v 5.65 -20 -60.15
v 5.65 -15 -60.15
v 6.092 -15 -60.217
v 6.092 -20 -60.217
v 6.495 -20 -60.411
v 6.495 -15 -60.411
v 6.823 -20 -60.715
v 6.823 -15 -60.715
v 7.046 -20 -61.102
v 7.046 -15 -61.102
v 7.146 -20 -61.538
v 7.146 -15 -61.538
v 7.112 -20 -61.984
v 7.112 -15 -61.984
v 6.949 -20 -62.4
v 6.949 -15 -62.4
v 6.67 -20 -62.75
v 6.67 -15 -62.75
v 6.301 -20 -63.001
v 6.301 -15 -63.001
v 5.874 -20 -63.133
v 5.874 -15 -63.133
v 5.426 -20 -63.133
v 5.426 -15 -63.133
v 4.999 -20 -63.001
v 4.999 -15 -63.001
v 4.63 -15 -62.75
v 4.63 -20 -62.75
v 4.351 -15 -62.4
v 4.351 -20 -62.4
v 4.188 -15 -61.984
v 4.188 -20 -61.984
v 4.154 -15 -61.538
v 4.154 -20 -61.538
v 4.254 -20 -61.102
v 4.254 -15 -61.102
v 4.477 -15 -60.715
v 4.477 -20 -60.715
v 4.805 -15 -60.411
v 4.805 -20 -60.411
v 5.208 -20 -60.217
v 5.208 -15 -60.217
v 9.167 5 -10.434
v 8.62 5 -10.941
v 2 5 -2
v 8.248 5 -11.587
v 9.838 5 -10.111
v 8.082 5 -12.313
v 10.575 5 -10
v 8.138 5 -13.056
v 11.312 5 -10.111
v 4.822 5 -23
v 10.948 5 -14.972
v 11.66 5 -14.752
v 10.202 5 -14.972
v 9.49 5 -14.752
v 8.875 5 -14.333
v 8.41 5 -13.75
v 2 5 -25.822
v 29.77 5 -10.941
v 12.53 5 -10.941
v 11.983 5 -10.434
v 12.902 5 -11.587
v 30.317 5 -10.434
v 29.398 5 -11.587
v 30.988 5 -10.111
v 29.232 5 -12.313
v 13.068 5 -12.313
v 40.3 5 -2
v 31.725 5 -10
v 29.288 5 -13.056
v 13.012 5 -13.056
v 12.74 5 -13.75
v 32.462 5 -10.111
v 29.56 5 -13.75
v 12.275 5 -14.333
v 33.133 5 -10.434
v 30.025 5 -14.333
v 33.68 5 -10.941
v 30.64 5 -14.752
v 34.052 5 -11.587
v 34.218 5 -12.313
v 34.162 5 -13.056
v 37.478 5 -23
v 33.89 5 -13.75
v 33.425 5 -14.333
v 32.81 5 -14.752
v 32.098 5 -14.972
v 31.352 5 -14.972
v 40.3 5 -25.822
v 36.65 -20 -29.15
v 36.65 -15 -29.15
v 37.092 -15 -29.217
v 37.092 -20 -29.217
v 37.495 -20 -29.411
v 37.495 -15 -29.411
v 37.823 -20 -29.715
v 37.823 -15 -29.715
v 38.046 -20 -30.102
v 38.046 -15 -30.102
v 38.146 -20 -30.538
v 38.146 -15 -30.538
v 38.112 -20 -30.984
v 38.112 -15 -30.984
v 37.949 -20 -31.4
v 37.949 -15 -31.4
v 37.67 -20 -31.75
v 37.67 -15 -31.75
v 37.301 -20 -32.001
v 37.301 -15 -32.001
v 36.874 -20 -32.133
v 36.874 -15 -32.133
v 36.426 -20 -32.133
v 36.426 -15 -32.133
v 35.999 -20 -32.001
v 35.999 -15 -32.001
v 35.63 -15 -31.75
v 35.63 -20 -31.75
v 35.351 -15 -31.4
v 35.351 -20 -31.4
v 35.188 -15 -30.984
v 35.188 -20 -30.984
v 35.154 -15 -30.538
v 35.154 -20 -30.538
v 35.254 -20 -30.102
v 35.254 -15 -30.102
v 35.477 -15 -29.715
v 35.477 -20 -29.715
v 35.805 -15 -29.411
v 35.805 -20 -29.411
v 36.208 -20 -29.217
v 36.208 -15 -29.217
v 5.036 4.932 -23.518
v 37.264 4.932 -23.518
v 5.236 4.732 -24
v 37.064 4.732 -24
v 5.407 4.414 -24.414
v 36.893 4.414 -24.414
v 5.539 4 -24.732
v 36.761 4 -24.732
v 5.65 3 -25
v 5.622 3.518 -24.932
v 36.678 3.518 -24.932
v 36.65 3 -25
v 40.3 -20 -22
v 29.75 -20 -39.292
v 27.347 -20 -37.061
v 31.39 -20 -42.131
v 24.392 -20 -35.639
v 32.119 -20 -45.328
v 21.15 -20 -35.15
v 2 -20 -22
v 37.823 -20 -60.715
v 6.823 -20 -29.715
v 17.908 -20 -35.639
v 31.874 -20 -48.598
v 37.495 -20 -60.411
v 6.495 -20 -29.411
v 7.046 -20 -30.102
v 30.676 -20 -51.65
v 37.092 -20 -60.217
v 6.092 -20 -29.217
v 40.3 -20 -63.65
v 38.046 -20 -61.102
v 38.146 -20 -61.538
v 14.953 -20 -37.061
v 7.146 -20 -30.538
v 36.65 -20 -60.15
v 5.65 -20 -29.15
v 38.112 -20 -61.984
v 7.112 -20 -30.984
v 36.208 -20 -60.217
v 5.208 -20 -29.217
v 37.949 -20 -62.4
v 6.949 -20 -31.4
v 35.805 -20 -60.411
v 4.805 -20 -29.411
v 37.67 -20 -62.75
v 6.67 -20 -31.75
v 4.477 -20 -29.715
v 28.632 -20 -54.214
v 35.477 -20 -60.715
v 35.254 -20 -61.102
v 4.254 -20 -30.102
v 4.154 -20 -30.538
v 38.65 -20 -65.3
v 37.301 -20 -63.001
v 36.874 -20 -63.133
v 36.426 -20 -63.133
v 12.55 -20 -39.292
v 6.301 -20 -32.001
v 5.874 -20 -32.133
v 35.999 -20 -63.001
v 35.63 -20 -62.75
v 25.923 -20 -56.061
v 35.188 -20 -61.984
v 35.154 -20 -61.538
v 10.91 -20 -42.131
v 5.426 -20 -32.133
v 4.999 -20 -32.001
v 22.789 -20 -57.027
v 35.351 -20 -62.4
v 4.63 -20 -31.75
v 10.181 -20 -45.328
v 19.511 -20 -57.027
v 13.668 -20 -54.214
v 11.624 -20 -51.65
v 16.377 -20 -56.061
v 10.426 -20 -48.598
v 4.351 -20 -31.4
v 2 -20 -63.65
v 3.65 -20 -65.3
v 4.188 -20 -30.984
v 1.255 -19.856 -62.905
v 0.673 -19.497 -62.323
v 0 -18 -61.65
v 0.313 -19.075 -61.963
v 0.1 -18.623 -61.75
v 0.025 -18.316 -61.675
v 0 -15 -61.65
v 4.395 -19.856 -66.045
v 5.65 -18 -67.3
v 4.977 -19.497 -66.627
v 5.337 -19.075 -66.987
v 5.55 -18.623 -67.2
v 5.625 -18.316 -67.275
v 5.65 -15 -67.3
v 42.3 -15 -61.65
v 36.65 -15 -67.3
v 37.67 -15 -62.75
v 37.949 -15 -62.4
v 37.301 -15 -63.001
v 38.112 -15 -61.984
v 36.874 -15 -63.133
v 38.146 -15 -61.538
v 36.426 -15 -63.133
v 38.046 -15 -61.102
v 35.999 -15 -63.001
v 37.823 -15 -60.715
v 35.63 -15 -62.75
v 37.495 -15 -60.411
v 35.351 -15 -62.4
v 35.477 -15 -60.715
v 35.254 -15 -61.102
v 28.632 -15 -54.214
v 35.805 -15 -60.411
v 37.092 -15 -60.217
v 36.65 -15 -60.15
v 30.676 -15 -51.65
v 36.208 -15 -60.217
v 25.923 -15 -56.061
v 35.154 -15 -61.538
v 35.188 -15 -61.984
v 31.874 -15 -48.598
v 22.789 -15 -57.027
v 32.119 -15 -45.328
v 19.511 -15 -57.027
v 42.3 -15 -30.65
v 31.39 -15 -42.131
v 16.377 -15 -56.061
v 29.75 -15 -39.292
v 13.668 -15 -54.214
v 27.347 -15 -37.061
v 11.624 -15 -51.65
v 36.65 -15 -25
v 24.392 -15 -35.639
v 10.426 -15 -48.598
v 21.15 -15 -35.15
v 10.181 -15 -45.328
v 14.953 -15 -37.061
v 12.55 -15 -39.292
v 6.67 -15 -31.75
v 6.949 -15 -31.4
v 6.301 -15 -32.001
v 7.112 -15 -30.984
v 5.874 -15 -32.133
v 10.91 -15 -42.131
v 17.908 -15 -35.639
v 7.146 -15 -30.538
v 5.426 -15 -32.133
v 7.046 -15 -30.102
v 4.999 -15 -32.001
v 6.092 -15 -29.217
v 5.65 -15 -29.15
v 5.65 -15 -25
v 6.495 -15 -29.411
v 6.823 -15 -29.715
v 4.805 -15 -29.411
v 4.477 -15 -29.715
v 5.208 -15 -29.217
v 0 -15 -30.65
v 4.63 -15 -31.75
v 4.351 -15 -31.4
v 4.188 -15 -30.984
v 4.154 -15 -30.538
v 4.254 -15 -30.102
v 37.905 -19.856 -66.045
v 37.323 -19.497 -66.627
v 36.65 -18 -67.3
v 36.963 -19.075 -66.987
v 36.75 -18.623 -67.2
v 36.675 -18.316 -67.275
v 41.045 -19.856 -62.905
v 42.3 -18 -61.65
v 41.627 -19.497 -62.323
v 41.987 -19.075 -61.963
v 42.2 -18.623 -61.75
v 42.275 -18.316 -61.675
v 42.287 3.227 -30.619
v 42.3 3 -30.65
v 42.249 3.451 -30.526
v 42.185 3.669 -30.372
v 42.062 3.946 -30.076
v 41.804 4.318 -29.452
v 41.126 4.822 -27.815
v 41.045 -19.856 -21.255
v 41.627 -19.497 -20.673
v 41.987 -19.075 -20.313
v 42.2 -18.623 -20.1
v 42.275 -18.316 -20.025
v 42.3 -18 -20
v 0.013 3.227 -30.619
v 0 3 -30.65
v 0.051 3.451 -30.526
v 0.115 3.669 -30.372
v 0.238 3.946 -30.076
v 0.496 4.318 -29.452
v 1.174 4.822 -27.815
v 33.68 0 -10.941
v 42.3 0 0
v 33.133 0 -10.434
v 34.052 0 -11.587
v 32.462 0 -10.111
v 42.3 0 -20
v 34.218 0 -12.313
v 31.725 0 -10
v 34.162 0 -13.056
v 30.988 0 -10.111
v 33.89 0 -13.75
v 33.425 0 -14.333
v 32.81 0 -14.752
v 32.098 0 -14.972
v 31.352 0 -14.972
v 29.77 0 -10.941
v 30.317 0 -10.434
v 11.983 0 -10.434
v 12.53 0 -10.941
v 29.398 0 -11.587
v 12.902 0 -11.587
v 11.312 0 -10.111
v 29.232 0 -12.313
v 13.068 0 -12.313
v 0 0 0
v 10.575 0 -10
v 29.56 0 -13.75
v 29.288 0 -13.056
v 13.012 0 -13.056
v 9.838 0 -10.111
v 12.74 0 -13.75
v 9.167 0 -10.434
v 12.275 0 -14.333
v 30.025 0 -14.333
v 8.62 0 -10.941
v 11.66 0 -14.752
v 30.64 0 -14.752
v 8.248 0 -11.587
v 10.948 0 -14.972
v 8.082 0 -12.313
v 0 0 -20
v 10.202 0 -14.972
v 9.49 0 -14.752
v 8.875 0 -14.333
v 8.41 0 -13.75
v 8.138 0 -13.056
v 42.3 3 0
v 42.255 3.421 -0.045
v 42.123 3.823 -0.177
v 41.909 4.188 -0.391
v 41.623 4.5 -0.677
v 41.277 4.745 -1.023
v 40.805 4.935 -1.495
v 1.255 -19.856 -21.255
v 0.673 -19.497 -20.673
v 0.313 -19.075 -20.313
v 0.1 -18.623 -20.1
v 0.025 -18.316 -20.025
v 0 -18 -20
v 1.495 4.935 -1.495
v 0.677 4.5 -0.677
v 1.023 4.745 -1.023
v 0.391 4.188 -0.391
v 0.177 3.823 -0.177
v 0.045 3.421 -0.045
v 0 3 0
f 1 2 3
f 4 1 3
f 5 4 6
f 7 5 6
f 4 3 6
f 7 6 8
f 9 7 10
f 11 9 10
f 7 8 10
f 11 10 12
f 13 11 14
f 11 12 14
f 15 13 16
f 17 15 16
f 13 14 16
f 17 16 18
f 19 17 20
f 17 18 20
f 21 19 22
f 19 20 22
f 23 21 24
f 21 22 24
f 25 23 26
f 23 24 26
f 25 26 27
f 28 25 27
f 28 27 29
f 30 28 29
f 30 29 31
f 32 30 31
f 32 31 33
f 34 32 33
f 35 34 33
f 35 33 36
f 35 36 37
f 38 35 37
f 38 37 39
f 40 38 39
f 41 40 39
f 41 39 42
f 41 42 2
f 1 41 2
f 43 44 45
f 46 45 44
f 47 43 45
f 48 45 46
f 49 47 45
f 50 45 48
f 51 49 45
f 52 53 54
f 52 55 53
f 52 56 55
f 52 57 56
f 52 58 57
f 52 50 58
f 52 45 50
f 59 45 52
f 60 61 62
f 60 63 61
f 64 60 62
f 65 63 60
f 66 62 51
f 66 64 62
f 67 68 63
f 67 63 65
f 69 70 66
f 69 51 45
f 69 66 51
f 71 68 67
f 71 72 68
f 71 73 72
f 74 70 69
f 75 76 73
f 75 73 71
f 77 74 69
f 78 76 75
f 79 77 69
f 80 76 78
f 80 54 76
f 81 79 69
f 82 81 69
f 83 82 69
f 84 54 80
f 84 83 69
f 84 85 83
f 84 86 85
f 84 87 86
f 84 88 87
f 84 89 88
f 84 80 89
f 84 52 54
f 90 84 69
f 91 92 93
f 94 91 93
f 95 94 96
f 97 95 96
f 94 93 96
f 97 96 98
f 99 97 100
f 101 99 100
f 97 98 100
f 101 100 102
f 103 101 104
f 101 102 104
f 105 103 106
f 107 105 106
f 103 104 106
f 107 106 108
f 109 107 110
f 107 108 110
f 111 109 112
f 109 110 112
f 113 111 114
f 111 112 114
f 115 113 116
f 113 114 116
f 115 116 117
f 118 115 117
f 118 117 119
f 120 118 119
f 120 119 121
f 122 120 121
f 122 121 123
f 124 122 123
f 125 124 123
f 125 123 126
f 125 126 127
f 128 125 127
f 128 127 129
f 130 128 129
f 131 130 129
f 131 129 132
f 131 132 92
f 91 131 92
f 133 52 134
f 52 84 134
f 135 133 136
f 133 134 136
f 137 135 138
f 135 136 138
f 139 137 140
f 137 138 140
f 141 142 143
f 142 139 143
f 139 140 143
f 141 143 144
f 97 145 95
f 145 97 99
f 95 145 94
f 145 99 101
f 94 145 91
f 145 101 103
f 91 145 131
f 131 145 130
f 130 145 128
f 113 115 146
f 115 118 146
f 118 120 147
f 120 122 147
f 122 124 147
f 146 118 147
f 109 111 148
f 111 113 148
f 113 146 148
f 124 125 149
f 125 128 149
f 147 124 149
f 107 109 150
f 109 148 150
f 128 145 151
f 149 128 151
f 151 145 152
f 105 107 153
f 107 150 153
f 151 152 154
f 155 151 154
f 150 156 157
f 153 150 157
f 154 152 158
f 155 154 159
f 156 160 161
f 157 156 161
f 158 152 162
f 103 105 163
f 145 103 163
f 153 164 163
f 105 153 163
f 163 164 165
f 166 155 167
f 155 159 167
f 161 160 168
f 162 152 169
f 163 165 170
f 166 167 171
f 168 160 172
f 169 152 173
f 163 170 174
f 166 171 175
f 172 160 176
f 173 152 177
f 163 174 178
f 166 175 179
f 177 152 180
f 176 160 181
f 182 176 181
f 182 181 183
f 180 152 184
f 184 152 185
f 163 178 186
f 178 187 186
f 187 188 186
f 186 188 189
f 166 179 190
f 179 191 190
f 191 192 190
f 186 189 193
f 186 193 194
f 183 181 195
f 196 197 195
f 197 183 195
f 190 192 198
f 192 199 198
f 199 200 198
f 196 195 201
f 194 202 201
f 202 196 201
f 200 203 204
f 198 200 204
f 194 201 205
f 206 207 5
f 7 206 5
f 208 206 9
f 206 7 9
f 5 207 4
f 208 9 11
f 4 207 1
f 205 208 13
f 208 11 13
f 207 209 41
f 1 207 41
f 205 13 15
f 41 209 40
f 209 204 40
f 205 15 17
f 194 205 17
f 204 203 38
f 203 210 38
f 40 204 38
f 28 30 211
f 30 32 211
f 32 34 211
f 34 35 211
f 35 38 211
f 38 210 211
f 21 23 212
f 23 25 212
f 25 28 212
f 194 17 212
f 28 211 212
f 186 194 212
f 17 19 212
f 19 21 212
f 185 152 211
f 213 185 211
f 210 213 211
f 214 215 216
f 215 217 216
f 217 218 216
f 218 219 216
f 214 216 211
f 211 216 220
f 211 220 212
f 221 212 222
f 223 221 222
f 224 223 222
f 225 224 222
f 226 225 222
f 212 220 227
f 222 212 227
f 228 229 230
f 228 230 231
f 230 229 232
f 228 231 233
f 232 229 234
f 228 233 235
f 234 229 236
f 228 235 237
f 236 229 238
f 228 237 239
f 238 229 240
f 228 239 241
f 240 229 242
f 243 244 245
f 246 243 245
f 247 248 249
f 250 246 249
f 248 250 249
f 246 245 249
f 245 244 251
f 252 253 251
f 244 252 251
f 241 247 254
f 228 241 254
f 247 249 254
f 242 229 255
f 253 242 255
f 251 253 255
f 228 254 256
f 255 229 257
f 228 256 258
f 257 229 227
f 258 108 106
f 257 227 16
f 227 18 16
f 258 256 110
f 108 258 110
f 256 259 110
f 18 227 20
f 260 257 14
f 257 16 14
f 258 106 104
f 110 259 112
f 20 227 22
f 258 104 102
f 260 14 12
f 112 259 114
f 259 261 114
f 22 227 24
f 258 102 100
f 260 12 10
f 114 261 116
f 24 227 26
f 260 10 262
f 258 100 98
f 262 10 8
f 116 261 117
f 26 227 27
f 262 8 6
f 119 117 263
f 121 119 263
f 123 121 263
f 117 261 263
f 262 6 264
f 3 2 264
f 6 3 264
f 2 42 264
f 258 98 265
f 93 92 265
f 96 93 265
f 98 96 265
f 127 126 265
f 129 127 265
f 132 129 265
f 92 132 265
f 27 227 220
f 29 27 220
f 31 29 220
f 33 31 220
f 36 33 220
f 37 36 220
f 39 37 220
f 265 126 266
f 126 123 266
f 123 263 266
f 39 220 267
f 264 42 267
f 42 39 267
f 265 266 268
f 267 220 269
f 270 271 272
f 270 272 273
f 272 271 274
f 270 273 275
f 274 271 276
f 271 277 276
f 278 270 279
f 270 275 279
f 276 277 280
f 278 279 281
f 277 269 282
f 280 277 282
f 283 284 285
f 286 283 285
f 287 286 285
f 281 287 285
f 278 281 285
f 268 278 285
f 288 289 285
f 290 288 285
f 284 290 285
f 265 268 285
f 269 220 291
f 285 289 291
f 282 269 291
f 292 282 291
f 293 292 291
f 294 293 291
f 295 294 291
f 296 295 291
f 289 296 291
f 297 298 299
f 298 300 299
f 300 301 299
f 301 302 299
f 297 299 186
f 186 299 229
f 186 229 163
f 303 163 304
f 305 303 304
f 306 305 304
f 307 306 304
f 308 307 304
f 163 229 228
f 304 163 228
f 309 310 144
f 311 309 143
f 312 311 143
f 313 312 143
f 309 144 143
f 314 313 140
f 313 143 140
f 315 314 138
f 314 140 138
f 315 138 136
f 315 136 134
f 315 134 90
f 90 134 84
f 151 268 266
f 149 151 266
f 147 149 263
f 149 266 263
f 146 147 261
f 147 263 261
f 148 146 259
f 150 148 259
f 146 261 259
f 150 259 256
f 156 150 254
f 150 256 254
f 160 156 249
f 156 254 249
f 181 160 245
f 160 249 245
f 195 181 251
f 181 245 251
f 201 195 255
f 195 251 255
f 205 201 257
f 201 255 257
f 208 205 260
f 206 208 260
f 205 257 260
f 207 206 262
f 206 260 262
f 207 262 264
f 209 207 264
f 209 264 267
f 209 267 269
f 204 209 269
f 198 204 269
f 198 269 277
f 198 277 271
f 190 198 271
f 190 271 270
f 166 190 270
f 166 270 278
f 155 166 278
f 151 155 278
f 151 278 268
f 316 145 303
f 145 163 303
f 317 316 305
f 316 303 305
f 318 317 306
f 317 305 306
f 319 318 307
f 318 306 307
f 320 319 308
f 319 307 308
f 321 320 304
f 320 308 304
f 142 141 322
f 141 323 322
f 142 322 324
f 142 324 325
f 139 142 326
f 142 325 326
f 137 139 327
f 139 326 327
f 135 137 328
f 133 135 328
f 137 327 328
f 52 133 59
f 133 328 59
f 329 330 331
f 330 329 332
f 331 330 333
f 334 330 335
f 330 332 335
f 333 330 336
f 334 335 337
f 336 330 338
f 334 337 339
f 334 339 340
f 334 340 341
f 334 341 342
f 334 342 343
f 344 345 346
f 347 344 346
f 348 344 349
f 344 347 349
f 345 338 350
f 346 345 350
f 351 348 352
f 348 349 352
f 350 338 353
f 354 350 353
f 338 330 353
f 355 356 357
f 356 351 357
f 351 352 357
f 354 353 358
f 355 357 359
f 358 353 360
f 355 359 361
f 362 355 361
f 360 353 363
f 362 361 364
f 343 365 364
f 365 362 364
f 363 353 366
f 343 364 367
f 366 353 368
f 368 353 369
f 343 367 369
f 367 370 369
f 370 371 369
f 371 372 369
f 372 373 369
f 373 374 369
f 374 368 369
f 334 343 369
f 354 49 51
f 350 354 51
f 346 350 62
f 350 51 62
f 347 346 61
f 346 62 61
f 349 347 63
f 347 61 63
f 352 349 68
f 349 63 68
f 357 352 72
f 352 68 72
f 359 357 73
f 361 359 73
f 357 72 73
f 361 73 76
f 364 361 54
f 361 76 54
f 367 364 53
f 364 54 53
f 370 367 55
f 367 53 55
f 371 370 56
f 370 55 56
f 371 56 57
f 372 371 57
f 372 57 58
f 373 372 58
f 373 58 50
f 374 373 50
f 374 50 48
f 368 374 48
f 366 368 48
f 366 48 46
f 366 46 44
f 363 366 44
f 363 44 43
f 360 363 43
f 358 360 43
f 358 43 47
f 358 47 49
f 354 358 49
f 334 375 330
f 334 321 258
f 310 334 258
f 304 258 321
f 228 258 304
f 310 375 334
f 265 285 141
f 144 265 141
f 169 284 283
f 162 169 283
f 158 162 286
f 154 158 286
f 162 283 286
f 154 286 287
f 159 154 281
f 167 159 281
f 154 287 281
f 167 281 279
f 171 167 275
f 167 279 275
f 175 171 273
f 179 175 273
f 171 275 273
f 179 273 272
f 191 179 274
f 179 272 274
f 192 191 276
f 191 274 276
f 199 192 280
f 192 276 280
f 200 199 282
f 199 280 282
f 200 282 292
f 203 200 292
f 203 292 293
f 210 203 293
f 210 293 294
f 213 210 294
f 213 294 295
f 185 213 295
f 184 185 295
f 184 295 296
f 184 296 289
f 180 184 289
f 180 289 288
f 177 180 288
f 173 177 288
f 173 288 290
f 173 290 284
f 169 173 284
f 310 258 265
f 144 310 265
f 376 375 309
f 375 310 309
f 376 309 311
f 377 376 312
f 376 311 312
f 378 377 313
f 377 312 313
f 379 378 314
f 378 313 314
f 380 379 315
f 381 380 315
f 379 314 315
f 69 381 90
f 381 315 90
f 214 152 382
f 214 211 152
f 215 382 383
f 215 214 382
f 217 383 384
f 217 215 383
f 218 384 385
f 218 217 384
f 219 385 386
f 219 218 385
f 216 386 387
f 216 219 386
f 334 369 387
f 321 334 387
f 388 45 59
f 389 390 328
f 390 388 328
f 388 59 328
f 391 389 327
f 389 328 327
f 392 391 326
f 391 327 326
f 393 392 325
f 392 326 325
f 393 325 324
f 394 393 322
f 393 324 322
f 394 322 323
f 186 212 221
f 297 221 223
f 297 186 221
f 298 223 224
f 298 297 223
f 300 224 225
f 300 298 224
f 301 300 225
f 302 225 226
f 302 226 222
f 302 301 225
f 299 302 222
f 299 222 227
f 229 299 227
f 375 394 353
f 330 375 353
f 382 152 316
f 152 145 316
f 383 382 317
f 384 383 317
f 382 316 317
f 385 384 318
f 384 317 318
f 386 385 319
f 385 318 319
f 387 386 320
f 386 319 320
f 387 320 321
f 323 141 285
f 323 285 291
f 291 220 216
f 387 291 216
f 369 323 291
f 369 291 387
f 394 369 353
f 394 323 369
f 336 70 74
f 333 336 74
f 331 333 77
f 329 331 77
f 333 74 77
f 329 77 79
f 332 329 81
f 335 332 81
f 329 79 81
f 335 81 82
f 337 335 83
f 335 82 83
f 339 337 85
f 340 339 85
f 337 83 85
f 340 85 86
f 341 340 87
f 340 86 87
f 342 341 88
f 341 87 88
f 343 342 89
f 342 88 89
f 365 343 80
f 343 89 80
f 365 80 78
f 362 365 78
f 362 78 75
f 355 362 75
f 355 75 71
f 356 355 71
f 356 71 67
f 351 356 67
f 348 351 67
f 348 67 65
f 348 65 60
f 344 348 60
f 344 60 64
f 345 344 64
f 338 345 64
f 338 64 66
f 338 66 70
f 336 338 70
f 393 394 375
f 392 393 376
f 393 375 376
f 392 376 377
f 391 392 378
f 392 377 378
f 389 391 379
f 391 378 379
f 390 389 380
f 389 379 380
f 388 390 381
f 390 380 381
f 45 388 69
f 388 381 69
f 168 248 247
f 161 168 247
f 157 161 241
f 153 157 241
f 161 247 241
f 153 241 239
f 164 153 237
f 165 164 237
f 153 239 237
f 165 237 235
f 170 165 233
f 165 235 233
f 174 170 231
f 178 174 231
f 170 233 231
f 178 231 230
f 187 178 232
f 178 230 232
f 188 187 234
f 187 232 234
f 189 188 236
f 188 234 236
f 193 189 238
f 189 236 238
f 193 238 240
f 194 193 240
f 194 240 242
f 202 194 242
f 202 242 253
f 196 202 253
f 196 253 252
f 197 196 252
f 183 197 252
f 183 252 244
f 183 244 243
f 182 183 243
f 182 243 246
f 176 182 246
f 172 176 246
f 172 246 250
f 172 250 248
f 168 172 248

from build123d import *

# Parameters (mm, degrees)
EXTRUDE_1_DEPTH     = 42.3
SKETCH_2_R          = 11
SKETCH_2_R_2        = 1.5
SKETCH_2_R_3        = 2.5
CUT_EXTRUDE_1_DEPTH = 84.328146505
EXTRUDE_2_DEPTH     = 20
FILLET_1_R          = 2


with BuildPart() as part:
    # 스케치1 → 보스-돌출1 (new body)
    with BuildSketch(Plane(origin=(0, 0, 0), x_dir=(0, 0, -1), z_dir=(1, 0, 0))):
        Polygon((0, 5), (0, 0), (20, 0), (20, -20), (67.3, -20), (67.3, -15), (25, -15), (25, 5), align=None)
    extrude(amount=EXTRUDE_1_DEPTH)

    # 스케치2 → 컷-돌출1 (cut, through all)
    with BuildSketch(Plane(origin=(0, 5, 0), x_dir=(1, 0, 0), z_dir=(0, 1, 0))):
        Polygon((0, 61.65), (5.65, 67.3), (0, 67.3), align=None)
        Polygon((42.3, 67.3), (36.65, 67.3), (42.3, 61.65), align=None)
        with Locations(Location((21.15, 46.15, 0), (0, 0, 270))):
            Circle(SKETCH_2_R)
        with Locations(Location((5.65, 61.65, 0), (0, 0, 270))):
            Circle(SKETCH_2_R_2)
        with Locations(Location((36.65, 61.65, 0), (0, 0, 270))):
            Circle(SKETCH_2_R_2)
        with Locations(Location((5.65, 30.65, 0), (0, 0, 270))):
            Circle(SKETCH_2_R_2)
        with Locations(Location((36.65, 30.65, 0), (0, 0, 270))):
            Circle(SKETCH_2_R_2)
        with Locations(Location((10.575, 12.5, 0), (0, 0, 270))):
            Circle(SKETCH_2_R_3)
        with Locations(Location((31.725, 12.5, 0), (0, 0, 270))):
            Circle(SKETCH_2_R_3)
    extrude(amount=-CUT_EXTRUDE_1_DEPTH, mode=Mode.SUBTRACT)

    # 스케치2<4> → 보스-돌출2 (add)
    with BuildSketch(Plane(origin=(0, 5, 0), x_dir=(1, 0, 0), z_dir=(0, 1, 0))):
        Polygon((5.65, 25), (0, 30.65), (0, 25), align=None)
        Polygon((42.3, 25), (42.3, 30.65), (36.65, 25), align=None)
    extrude(amount=-EXTRUDE_2_DEPTH)

    # 필렛1
    fillet_1_edges = [part.edges().sort_by_distance(p)[0] for p in [
        (21.15, -20, -67.3),
        (42.3, -20, -40.825),
        (0, -20, -40.825),
        (21.15, -20, -20),
        (2.825, 5, -27.825),
        (21.15, 5, -25),
        (39.475, 5, -27.825),
        (21.15, 5, 0),
        (0, 5, -15.325),
        (42.3, 5, -15.325),
    ]]
    fillet(fillet_1_edges, radius=FILLET_1_R)


solid = part.part
